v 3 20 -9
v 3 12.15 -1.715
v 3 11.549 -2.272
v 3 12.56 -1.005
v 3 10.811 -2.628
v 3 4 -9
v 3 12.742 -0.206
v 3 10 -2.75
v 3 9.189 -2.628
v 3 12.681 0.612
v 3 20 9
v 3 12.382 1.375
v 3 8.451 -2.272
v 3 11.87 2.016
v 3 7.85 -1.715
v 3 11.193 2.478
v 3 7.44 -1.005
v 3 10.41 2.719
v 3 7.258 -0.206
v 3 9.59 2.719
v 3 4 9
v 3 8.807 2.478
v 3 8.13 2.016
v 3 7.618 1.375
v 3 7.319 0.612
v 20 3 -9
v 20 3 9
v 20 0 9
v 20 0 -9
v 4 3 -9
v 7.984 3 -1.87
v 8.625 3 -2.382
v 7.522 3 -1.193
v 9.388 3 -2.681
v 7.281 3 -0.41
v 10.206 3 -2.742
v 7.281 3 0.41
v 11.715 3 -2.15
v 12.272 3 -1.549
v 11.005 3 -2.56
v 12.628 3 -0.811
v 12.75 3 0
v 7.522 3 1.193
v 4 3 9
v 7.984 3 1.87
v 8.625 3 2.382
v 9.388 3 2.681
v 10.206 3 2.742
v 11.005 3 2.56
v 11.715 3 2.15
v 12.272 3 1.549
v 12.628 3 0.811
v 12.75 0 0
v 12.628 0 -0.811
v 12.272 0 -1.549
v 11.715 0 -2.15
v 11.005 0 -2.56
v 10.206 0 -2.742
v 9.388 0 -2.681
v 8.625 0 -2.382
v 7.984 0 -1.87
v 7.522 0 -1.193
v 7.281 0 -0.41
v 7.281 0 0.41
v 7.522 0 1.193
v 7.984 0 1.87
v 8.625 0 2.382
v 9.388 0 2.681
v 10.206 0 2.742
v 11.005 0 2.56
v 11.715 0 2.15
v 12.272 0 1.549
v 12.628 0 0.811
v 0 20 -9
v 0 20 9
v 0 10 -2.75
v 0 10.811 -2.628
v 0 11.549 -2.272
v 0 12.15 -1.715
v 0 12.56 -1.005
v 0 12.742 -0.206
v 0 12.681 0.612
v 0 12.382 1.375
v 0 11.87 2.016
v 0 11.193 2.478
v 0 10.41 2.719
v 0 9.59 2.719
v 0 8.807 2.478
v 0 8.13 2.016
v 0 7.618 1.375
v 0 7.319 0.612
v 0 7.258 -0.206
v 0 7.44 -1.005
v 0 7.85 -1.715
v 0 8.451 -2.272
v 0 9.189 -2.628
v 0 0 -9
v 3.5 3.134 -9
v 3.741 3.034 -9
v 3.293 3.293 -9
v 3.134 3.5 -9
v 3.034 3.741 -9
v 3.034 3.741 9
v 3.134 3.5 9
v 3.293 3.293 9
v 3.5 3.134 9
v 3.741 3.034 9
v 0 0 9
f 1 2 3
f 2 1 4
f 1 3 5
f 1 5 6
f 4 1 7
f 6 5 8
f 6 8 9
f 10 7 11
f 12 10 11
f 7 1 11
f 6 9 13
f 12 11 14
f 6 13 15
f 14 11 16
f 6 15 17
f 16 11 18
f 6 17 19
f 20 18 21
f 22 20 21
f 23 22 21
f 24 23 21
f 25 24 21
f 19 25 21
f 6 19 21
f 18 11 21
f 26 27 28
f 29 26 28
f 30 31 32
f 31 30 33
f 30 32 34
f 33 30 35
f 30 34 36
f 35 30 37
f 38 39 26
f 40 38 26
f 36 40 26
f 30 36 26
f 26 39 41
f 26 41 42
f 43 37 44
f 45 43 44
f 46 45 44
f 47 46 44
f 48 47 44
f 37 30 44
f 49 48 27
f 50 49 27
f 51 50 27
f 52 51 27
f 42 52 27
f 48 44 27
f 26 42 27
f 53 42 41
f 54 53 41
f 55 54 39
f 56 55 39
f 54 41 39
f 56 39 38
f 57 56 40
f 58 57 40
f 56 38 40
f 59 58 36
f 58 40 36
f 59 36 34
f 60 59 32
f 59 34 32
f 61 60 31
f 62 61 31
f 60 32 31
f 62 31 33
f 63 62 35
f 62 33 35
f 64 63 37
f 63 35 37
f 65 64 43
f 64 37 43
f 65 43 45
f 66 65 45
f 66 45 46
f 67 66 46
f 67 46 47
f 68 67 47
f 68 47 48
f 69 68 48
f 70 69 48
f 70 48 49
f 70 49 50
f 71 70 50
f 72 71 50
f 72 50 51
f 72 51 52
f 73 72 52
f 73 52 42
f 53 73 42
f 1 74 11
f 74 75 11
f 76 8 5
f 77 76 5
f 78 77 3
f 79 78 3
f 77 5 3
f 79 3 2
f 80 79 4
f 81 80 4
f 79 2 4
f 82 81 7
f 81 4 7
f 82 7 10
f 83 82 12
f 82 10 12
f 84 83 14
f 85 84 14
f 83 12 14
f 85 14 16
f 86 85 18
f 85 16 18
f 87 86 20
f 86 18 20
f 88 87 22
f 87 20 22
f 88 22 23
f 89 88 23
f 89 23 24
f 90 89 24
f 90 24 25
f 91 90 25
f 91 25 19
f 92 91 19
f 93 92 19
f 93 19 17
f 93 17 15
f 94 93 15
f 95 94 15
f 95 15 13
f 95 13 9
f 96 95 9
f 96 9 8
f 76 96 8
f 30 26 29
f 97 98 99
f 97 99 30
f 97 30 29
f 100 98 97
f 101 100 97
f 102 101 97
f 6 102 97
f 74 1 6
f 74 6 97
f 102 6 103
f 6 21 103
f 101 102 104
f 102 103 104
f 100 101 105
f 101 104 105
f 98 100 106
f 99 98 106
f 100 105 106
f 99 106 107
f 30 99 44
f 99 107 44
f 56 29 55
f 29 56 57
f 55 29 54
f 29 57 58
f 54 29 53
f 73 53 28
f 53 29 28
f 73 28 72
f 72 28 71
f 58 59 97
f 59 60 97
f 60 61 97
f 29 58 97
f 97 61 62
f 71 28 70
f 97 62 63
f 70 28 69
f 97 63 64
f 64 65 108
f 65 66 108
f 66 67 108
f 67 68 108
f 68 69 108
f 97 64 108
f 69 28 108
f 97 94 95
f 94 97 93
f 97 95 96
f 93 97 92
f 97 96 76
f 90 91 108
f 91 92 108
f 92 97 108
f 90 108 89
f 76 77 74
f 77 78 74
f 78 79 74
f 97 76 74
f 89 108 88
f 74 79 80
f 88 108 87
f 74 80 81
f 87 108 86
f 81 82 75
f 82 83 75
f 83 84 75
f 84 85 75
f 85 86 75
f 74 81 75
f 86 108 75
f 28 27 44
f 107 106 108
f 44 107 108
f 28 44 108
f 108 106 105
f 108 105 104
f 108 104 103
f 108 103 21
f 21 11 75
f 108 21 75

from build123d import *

# Parameters (mm, degrees)
BOSS_EXTRUDE1_DEPTH = 9
SKETCH2_R           = 2.75
CUT_EXTRUDE1_DEPTH  = 4
SKETCH3_R           = 2.75
CUT_EXTRUDE2_DEPTH  = 4


with BuildPart() as part:
    # Sketch1 → Boss-Extrude1 (new body, symmetric)
    with BuildSketch(Plane.XY):
        with BuildLine():
            Line((0, 0), (0, 20))
            Line((0, 20), (3, 20))
            Line((3, 20), (3, 4))
            ThreePointArc((3, 4), (3.292893219, 3.292893219), (4, 3))
            Line((4, 3), (20, 3))
            Line((20, 3), (20, 0))
            Line((20, 0), (0, 0))
        make_face()
    extrude(amount=BOSS_EXTRUDE1_DEPTH, both=True)

    # Sketch2 → Cut-Extrude1 (cut, through all)
    with BuildSketch(Plane(origin=(0, 3, 0), x_dir=(1, 0, 0), z_dir=(0, 1, 0))):
        with Locations((10, 0)):
            Circle(SKETCH2_R)
    extrude(amount=-CUT_EXTRUDE1_DEPTH, mode=Mode.SUBTRACT)

    # Sketch3 → Cut-Extrude2 (cut, through all)
    with BuildSketch(Plane(origin=(3, 0, 0), x_dir=(0, 0, -1), z_dir=(1, 0, 0))):
        with Locations((0, 10)):
            Circle(SKETCH3_R)
    extrude(amount=-CUT_EXTRUDE2_DEPTH, mode=Mode.SUBTRACT)


solid = part.part
